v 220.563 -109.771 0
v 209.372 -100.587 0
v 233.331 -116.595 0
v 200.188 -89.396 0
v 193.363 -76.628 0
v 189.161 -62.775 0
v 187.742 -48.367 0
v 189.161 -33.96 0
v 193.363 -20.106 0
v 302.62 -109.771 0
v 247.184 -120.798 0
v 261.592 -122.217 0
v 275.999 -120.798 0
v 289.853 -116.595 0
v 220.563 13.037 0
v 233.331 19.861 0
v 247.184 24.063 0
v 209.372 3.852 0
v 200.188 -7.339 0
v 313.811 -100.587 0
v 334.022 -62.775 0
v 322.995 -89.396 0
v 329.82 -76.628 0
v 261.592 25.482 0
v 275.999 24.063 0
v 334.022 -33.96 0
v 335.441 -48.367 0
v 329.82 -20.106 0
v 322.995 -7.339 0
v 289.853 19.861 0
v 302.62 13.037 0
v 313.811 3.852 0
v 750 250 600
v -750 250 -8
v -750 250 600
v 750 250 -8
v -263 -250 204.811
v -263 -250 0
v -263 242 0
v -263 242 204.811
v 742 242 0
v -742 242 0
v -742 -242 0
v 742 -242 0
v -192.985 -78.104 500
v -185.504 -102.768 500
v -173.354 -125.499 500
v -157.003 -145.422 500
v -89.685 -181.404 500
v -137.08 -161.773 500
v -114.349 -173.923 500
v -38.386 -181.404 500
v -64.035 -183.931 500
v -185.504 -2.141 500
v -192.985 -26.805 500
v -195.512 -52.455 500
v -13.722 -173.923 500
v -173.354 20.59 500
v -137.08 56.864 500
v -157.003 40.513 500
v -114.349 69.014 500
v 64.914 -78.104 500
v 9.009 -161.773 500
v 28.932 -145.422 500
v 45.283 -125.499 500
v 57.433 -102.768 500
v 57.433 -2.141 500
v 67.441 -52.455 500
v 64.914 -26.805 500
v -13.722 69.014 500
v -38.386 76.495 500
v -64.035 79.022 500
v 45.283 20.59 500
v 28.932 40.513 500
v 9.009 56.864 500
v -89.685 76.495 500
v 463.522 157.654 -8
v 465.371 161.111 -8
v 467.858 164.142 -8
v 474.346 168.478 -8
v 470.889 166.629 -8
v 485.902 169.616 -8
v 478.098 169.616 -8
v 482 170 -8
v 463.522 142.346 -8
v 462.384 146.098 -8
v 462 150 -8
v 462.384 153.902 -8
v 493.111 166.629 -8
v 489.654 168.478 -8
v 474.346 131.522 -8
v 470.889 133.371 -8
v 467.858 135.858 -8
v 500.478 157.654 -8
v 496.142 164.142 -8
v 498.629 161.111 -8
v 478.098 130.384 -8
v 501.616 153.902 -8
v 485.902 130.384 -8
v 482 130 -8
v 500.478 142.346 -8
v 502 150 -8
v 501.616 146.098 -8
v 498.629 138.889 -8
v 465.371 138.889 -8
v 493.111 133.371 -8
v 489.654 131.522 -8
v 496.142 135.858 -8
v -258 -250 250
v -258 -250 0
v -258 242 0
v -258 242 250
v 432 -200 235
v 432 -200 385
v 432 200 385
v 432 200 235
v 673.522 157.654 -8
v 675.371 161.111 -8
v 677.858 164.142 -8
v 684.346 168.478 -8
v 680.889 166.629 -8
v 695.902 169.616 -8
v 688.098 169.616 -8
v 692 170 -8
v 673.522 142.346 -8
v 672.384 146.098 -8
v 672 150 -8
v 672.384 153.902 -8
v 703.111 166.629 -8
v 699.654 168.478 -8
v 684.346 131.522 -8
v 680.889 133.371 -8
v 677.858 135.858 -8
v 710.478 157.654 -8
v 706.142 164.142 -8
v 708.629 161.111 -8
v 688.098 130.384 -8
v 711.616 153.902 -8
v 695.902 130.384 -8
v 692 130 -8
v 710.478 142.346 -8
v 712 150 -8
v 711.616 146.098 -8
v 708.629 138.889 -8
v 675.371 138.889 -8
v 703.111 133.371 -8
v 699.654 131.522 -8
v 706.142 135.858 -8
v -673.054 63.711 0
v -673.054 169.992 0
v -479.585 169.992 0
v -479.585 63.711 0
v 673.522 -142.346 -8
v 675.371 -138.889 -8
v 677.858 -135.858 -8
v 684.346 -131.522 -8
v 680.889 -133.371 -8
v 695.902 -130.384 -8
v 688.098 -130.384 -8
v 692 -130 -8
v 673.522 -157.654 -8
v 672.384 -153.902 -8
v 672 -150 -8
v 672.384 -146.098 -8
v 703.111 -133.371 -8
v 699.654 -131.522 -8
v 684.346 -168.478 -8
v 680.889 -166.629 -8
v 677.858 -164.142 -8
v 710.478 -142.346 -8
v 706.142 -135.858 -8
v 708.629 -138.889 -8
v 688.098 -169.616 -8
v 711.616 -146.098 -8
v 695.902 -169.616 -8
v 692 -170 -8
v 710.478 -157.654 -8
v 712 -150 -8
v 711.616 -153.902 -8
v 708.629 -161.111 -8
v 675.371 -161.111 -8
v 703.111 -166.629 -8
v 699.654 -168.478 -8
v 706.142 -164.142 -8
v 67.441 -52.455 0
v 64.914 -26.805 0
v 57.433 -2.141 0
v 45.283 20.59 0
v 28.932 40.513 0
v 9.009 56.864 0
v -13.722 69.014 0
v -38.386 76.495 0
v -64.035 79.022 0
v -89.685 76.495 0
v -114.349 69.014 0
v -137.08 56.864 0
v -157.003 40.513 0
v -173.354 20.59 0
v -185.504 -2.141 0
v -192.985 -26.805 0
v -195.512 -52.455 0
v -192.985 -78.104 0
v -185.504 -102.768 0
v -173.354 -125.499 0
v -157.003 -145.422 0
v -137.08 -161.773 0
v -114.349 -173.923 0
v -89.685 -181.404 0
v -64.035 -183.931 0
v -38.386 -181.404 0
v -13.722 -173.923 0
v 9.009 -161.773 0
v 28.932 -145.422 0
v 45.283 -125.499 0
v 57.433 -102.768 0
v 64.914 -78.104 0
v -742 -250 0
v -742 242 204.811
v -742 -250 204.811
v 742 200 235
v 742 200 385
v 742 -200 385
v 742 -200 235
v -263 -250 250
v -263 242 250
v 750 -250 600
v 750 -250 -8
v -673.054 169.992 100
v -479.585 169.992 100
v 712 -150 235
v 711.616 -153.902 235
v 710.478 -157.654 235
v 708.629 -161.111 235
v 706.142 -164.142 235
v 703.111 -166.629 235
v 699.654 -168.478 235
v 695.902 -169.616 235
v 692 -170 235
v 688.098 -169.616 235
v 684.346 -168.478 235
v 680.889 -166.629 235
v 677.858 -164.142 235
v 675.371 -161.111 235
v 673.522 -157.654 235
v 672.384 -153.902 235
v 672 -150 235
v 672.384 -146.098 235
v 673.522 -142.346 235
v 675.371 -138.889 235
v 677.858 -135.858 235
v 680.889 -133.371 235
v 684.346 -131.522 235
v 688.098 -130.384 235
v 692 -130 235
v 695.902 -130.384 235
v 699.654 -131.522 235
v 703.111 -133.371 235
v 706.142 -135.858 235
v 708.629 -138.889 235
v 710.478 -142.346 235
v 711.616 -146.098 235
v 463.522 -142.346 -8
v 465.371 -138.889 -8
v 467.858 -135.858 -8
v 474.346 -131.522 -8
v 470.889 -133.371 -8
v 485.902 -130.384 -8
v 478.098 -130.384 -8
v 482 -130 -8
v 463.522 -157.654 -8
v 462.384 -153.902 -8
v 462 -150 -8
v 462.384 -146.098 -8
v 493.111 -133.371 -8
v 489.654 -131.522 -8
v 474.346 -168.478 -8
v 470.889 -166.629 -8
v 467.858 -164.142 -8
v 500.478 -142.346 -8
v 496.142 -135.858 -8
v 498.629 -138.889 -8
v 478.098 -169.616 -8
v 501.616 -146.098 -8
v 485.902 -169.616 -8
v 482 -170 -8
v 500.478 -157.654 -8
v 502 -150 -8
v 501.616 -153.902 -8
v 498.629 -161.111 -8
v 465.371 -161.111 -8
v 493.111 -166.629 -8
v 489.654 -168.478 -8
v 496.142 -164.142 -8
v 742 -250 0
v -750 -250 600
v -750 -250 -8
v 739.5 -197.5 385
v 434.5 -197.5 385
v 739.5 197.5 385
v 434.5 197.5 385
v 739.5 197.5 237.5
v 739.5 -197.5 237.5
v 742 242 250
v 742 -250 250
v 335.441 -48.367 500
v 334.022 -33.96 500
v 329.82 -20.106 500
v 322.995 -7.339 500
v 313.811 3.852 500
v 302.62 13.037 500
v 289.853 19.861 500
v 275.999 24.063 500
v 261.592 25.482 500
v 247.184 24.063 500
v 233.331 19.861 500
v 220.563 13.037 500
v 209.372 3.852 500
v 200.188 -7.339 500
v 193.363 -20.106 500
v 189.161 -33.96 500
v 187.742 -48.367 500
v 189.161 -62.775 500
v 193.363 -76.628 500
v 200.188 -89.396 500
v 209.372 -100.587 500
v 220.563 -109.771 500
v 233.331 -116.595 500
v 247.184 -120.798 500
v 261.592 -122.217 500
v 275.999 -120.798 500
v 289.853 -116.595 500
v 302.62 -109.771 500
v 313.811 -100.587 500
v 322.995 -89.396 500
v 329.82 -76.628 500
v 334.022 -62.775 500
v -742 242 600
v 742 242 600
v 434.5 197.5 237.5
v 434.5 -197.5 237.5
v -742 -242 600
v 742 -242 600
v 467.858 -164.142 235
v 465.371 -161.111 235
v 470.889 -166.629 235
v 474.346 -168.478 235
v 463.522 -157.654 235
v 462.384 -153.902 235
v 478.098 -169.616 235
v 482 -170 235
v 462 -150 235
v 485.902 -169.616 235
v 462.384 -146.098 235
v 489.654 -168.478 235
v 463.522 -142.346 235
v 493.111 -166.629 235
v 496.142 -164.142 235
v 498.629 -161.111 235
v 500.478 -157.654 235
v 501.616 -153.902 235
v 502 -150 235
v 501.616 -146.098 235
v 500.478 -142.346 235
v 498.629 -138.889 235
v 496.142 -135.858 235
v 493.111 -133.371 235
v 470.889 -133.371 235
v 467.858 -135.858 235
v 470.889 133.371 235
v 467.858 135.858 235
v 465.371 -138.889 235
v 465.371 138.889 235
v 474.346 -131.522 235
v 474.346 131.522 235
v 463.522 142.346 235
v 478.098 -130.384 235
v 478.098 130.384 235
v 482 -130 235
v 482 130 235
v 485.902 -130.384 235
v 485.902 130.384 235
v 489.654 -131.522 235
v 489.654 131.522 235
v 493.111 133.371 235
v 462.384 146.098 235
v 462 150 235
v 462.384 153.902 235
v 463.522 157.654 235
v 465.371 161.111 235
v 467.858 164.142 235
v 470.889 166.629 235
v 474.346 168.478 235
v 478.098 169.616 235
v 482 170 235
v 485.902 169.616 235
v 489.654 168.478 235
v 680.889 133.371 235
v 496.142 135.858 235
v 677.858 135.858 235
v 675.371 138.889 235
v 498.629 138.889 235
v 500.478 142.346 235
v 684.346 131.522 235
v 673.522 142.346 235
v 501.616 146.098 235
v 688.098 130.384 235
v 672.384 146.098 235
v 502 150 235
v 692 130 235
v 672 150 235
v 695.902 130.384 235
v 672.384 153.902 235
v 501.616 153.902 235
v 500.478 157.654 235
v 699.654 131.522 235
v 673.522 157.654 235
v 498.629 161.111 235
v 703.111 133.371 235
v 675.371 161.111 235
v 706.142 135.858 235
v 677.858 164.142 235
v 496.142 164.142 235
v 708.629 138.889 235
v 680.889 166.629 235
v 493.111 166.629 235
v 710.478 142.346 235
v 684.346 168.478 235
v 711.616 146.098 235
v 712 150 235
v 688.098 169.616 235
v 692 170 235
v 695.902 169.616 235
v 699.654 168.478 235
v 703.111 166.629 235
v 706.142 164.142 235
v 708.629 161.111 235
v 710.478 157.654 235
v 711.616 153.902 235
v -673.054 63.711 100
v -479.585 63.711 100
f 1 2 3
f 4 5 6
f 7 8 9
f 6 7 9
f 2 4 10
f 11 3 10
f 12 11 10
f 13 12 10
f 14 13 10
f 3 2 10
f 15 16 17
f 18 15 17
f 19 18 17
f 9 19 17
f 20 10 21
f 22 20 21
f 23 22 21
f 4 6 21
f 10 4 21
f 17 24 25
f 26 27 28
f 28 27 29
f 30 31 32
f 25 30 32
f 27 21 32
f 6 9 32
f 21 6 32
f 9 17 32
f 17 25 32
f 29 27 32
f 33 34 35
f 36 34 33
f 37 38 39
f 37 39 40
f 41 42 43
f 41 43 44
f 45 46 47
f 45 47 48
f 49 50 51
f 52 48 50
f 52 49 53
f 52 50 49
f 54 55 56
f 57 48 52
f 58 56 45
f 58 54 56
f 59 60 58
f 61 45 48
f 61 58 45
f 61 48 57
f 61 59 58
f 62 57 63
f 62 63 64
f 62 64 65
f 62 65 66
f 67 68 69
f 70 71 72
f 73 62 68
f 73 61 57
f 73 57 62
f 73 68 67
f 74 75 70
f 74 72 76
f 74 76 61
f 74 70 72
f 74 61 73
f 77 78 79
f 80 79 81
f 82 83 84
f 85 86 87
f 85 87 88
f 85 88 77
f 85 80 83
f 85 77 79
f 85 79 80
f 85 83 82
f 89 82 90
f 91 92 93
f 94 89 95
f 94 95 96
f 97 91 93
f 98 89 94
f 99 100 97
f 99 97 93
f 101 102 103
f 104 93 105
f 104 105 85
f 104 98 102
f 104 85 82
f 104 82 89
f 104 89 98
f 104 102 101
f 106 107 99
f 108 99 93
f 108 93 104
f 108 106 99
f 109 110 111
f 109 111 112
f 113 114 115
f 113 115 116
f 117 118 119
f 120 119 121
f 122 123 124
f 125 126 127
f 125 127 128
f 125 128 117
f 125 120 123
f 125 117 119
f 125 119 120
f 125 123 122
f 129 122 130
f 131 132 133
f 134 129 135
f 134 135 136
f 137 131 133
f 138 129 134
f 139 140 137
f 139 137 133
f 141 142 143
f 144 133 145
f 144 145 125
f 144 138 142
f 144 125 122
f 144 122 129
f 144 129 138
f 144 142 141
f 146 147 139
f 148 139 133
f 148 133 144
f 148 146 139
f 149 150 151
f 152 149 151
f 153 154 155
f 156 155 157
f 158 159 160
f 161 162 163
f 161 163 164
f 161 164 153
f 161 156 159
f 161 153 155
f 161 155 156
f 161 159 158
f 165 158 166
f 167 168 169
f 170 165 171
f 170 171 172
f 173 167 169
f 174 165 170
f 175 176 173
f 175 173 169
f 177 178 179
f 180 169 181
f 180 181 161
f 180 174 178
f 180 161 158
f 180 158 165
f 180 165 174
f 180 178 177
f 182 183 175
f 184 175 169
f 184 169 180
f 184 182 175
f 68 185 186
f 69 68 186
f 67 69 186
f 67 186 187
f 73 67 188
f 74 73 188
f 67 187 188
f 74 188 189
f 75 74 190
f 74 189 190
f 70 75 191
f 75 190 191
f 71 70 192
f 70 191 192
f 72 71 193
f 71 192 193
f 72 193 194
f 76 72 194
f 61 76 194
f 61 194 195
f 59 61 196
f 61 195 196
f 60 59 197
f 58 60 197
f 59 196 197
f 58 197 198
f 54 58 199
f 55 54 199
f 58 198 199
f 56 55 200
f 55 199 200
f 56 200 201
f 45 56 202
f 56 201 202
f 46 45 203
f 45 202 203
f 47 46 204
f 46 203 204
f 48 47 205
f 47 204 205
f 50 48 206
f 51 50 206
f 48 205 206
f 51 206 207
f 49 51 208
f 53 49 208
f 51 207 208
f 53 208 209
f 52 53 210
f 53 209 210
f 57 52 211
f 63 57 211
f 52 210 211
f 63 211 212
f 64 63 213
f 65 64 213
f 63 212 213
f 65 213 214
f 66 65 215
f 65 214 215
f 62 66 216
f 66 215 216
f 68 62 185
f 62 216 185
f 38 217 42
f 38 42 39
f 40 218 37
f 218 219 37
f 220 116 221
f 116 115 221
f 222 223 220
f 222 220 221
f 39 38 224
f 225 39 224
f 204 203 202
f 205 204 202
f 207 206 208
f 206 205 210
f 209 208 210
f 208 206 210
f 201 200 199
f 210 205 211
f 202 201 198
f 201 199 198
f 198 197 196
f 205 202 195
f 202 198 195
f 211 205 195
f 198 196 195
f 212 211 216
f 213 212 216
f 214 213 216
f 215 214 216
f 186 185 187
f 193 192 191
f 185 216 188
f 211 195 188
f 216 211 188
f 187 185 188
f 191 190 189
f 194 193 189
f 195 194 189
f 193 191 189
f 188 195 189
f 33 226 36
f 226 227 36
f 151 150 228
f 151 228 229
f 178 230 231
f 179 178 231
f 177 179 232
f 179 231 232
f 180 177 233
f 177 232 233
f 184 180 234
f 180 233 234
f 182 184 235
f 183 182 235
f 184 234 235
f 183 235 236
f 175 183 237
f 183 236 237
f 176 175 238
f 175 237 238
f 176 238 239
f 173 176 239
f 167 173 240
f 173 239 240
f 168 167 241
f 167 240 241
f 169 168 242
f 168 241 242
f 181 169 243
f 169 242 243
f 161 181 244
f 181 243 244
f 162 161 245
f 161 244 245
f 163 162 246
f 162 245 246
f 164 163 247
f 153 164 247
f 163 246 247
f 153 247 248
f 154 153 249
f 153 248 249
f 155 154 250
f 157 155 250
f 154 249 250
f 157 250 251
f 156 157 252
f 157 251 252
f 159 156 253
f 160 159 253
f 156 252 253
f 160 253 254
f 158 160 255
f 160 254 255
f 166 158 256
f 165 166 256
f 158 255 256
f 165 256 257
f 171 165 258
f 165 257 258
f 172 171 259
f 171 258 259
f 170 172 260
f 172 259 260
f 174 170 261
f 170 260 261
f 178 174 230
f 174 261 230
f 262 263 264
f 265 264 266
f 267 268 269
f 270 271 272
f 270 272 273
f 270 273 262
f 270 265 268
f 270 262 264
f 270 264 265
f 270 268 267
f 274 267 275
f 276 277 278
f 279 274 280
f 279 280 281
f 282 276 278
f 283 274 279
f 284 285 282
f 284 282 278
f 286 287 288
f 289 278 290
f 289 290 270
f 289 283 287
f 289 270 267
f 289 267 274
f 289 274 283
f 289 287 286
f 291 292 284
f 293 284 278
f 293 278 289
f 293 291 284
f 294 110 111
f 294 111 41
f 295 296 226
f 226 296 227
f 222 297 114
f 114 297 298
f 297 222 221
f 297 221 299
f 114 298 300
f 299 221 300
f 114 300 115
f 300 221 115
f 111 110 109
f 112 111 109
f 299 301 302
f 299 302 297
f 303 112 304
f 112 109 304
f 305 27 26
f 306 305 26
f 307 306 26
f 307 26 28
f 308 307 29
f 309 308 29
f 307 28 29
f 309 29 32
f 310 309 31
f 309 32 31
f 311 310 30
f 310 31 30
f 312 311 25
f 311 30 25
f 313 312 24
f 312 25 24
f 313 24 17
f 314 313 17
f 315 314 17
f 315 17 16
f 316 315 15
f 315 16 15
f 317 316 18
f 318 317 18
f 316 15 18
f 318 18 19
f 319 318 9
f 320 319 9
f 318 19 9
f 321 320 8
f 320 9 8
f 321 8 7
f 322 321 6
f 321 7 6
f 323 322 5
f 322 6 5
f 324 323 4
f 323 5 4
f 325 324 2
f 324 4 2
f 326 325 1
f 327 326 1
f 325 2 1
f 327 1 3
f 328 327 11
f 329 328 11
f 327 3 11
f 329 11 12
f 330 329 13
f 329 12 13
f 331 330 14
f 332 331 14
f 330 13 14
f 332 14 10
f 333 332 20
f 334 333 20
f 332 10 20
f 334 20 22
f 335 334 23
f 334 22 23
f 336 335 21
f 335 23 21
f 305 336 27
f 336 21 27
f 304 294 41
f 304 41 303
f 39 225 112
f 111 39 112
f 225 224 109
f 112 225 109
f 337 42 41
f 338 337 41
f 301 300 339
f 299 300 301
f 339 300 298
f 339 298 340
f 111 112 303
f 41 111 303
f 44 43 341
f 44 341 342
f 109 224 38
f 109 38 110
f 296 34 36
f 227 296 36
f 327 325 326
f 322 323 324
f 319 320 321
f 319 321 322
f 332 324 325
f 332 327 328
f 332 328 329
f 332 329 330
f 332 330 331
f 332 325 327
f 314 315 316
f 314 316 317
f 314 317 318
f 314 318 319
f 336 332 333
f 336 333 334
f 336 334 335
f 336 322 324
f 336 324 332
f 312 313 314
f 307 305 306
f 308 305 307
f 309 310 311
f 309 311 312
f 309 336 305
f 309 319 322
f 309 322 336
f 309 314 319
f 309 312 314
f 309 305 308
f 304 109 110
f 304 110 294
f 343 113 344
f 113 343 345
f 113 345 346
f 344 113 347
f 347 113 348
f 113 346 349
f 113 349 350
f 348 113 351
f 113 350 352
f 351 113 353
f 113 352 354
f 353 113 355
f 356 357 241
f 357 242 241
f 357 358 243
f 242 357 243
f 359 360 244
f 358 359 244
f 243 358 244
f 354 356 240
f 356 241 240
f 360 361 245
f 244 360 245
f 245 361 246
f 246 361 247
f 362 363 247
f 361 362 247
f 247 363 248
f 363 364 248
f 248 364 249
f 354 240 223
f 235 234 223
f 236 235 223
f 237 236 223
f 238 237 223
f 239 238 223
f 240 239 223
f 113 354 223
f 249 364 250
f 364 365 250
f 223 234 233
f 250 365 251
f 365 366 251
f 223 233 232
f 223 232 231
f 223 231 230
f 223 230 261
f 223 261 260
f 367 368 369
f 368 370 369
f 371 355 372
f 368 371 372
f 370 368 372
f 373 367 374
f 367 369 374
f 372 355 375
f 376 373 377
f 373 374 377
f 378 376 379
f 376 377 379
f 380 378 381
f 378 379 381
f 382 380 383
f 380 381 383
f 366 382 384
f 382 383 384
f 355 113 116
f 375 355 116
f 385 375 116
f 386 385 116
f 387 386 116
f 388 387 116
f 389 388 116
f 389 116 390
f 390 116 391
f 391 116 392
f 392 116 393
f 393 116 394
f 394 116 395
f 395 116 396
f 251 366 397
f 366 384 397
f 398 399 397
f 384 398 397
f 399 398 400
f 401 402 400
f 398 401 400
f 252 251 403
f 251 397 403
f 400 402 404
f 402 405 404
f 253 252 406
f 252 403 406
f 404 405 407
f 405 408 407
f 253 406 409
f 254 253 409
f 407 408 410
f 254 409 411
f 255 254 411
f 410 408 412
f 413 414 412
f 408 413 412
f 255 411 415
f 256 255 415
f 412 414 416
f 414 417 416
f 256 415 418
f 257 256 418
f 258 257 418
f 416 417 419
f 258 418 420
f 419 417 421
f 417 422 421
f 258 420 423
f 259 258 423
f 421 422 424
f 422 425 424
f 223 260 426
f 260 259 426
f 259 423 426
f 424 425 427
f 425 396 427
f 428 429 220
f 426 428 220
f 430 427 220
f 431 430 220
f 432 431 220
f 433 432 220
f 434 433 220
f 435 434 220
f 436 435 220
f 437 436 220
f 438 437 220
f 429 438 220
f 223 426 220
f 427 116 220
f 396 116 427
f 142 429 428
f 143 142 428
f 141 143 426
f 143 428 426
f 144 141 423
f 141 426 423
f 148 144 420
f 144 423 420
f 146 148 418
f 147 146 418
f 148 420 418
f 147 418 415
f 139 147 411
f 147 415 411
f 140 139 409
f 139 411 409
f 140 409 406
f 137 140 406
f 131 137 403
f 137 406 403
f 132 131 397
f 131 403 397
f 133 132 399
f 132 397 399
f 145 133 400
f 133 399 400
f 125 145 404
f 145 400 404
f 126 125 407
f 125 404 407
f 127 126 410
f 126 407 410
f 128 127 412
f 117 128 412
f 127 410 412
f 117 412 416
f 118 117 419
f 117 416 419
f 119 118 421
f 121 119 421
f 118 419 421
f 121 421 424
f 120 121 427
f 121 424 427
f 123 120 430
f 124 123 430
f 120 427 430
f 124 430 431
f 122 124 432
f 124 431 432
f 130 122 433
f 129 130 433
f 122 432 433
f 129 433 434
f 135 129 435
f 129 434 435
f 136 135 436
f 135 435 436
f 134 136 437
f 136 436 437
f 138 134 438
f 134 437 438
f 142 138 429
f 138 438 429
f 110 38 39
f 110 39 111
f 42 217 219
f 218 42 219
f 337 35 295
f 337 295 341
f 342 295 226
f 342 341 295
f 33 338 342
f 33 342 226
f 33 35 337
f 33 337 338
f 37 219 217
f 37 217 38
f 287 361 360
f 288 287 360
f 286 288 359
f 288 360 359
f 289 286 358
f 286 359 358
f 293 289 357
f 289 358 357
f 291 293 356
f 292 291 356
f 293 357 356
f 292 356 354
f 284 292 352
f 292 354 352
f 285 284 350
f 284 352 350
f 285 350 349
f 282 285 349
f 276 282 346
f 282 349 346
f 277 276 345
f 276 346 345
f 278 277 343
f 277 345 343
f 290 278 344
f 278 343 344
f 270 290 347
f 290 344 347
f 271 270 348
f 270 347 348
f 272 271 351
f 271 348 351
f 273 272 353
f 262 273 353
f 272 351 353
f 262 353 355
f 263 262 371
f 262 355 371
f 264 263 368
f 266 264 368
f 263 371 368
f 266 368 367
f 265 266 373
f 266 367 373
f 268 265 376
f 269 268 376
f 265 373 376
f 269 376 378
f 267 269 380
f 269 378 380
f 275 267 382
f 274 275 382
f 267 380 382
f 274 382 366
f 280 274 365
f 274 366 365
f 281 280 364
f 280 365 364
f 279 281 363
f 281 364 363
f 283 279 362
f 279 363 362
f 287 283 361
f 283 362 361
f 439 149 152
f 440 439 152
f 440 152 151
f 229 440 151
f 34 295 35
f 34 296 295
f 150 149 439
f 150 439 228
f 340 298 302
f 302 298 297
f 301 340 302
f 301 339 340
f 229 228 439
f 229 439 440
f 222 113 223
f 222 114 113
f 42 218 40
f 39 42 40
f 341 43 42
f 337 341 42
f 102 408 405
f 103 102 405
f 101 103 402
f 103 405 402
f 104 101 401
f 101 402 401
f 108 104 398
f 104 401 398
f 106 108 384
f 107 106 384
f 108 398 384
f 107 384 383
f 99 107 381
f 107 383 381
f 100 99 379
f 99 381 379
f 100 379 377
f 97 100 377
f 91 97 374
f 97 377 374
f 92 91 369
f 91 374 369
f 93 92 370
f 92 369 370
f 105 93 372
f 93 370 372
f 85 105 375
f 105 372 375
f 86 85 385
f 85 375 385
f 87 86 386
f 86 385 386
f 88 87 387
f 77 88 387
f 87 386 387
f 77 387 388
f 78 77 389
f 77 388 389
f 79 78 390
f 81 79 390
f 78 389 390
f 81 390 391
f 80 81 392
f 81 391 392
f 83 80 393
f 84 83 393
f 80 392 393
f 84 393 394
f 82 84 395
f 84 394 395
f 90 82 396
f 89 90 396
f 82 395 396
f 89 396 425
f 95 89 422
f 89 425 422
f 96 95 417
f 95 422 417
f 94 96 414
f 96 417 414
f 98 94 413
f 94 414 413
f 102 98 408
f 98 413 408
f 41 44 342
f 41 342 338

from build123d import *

# Parameters (mm, degrees)
F0_W           = 1500
F0_H           = 500
F0_W_2         = 1484
F0_H_2         = 484
F1_DEPTH       = 8
F2_DEPTH       = 600
F4_W           = 5
F4_H           = 250
F5_DEPTH       = 492
F7_DEPTH       = 200
F7_DEPTH_BACK  = 200
F8_T           = -2.5
F9_R           = 131.4761602714
F10_DEPTH      = 500
F9_R_2         = 73.8496876532
F11_W          = 193.4688985348
F11_H          = 106.2804311514
F12_DEPTH      = 100
F13_R          = 20
F14_DEPTH      = 243
F15_W          = 1000
F15_H          = 250
F16_DEPTH      = 250
F16_DEPTH_BACK = 242
F15_W_2        = 479
F15_H_2        = 204.8108279705


with BuildPart() as f1:
    # F0 (on Top) → F1 (new body)
    with BuildSketch(Plane.XY):
        Rectangle(F0_W, F0_H)
        Rectangle(F0_W_2, F0_H_2, mode=Mode.SUBTRACT)
        Rectangle(F0_W_2, F0_H_2)
    extrude(amount=-F1_DEPTH)


with BuildPart() as f2:
    # F0 (on Top) → F2 (new body)
    with BuildSketch(Plane.XY):
        Rectangle(F0_W, F0_H)
        Rectangle(F0_W_2, F0_H_2, mode=Mode.SUBTRACT)
    extrude(amount=F2_DEPTH)


with BuildPart() as f1_1:
    add(f1.part)

    # F3: union F2
    add(f2.part)


with BuildPart() as f5:
    # F4 (on face) → F5 (new body, through all)
    with BuildSketch(Plane.XZ.offset(250)):
        with Locations((-260.5, 125)):
            Rectangle(F4_W, F4_H)
    extrude(amount=-F5_DEPTH)


with BuildPart() as f7:
    # F6 (on Front) → F7 (new body, two sides)
    with BuildSketch(Plane.XZ) as f7_sk:
        Polygon((432, 235), (472, 235), (702, 235), (742, 235), (742, 385), (432, 385), align=None)
    extrude(amount=-F7_DEPTH)
    extrude(f7_sk.sketch, amount=F7_DEPTH_BACK)

    # F8
    f8_openings = [f7.faces().sort_by_distance(p)[0] for p in [
        (587, 0, 385),
    ]]
    offset(amount=F8_T, openings=f8_openings)

    # F13 (on face) → F14 (join, through all)
    with BuildSketch(Plane(origin=(0, 0, 235), x_dir=(1, 0, 0), z_dir=(0, 0, -1))):
        with Locations((482, 150)):
            Circle(F13_R)
        with Locations((692, 150)):
            Circle(F13_R)
        with Locations((692, -150)):
            Circle(F13_R)
        with Locations((482, -150)):
            Circle(F13_R)
    extrude(amount=F14_DEPTH)


with BuildPart() as f10:
    # F9 (on face) → F10 (new body)
    with BuildSketch(Plane.XY):
        with Locations((-64.0354678035, -52.4545870721)):
            Circle(F9_R)
    extrude(amount=F10_DEPTH)


with BuildPart() as f10b:
    # F9 (on face) → F10, piece 2 (new body)
    with BuildSketch(Plane.XY):
        with Locations((261.5916728973, -48.3672171831)):
            Circle(F9_R_2)
    extrude(amount=F10_DEPTH)


with BuildPart() as f12:
    # F11 (on face) → F12 (new body)
    with BuildSketch(Plane.XY):
        with Locations((-576.319232583, 116.8514415622)):
            Rectangle(F11_W, F11_H)
    extrude(amount=F12_DEPTH)


with BuildPart() as f16:
    # F15 (on Front) → F16 (new body, two sides)
    with BuildSketch(Plane.XZ) as f16_sk:
        with Locations((242, 125)):
            Rectangle(F15_W, F15_H)
    extrude(amount=F16_DEPTH)
    extrude(f16_sk.sketch, amount=-F16_DEPTH_BACK)


with BuildPart() as f16b:
    # F15 (on Front) → F16, piece 2 (new body, two sides)
    with BuildSketch(Plane.XZ) as f16_2_sk:
        with Locations((-502.5, 102.4054139853)):
            Rectangle(F15_W_2, F15_H_2)
    extrude(amount=F16_DEPTH)
    extrude(f16_2_sk.sketch, amount=-F16_DEPTH_BACK)


solid = Compound([f1_1.part, f5.part, f7.part, f10.part, f10b.part, f12.part, f16.part, f16b.part])
